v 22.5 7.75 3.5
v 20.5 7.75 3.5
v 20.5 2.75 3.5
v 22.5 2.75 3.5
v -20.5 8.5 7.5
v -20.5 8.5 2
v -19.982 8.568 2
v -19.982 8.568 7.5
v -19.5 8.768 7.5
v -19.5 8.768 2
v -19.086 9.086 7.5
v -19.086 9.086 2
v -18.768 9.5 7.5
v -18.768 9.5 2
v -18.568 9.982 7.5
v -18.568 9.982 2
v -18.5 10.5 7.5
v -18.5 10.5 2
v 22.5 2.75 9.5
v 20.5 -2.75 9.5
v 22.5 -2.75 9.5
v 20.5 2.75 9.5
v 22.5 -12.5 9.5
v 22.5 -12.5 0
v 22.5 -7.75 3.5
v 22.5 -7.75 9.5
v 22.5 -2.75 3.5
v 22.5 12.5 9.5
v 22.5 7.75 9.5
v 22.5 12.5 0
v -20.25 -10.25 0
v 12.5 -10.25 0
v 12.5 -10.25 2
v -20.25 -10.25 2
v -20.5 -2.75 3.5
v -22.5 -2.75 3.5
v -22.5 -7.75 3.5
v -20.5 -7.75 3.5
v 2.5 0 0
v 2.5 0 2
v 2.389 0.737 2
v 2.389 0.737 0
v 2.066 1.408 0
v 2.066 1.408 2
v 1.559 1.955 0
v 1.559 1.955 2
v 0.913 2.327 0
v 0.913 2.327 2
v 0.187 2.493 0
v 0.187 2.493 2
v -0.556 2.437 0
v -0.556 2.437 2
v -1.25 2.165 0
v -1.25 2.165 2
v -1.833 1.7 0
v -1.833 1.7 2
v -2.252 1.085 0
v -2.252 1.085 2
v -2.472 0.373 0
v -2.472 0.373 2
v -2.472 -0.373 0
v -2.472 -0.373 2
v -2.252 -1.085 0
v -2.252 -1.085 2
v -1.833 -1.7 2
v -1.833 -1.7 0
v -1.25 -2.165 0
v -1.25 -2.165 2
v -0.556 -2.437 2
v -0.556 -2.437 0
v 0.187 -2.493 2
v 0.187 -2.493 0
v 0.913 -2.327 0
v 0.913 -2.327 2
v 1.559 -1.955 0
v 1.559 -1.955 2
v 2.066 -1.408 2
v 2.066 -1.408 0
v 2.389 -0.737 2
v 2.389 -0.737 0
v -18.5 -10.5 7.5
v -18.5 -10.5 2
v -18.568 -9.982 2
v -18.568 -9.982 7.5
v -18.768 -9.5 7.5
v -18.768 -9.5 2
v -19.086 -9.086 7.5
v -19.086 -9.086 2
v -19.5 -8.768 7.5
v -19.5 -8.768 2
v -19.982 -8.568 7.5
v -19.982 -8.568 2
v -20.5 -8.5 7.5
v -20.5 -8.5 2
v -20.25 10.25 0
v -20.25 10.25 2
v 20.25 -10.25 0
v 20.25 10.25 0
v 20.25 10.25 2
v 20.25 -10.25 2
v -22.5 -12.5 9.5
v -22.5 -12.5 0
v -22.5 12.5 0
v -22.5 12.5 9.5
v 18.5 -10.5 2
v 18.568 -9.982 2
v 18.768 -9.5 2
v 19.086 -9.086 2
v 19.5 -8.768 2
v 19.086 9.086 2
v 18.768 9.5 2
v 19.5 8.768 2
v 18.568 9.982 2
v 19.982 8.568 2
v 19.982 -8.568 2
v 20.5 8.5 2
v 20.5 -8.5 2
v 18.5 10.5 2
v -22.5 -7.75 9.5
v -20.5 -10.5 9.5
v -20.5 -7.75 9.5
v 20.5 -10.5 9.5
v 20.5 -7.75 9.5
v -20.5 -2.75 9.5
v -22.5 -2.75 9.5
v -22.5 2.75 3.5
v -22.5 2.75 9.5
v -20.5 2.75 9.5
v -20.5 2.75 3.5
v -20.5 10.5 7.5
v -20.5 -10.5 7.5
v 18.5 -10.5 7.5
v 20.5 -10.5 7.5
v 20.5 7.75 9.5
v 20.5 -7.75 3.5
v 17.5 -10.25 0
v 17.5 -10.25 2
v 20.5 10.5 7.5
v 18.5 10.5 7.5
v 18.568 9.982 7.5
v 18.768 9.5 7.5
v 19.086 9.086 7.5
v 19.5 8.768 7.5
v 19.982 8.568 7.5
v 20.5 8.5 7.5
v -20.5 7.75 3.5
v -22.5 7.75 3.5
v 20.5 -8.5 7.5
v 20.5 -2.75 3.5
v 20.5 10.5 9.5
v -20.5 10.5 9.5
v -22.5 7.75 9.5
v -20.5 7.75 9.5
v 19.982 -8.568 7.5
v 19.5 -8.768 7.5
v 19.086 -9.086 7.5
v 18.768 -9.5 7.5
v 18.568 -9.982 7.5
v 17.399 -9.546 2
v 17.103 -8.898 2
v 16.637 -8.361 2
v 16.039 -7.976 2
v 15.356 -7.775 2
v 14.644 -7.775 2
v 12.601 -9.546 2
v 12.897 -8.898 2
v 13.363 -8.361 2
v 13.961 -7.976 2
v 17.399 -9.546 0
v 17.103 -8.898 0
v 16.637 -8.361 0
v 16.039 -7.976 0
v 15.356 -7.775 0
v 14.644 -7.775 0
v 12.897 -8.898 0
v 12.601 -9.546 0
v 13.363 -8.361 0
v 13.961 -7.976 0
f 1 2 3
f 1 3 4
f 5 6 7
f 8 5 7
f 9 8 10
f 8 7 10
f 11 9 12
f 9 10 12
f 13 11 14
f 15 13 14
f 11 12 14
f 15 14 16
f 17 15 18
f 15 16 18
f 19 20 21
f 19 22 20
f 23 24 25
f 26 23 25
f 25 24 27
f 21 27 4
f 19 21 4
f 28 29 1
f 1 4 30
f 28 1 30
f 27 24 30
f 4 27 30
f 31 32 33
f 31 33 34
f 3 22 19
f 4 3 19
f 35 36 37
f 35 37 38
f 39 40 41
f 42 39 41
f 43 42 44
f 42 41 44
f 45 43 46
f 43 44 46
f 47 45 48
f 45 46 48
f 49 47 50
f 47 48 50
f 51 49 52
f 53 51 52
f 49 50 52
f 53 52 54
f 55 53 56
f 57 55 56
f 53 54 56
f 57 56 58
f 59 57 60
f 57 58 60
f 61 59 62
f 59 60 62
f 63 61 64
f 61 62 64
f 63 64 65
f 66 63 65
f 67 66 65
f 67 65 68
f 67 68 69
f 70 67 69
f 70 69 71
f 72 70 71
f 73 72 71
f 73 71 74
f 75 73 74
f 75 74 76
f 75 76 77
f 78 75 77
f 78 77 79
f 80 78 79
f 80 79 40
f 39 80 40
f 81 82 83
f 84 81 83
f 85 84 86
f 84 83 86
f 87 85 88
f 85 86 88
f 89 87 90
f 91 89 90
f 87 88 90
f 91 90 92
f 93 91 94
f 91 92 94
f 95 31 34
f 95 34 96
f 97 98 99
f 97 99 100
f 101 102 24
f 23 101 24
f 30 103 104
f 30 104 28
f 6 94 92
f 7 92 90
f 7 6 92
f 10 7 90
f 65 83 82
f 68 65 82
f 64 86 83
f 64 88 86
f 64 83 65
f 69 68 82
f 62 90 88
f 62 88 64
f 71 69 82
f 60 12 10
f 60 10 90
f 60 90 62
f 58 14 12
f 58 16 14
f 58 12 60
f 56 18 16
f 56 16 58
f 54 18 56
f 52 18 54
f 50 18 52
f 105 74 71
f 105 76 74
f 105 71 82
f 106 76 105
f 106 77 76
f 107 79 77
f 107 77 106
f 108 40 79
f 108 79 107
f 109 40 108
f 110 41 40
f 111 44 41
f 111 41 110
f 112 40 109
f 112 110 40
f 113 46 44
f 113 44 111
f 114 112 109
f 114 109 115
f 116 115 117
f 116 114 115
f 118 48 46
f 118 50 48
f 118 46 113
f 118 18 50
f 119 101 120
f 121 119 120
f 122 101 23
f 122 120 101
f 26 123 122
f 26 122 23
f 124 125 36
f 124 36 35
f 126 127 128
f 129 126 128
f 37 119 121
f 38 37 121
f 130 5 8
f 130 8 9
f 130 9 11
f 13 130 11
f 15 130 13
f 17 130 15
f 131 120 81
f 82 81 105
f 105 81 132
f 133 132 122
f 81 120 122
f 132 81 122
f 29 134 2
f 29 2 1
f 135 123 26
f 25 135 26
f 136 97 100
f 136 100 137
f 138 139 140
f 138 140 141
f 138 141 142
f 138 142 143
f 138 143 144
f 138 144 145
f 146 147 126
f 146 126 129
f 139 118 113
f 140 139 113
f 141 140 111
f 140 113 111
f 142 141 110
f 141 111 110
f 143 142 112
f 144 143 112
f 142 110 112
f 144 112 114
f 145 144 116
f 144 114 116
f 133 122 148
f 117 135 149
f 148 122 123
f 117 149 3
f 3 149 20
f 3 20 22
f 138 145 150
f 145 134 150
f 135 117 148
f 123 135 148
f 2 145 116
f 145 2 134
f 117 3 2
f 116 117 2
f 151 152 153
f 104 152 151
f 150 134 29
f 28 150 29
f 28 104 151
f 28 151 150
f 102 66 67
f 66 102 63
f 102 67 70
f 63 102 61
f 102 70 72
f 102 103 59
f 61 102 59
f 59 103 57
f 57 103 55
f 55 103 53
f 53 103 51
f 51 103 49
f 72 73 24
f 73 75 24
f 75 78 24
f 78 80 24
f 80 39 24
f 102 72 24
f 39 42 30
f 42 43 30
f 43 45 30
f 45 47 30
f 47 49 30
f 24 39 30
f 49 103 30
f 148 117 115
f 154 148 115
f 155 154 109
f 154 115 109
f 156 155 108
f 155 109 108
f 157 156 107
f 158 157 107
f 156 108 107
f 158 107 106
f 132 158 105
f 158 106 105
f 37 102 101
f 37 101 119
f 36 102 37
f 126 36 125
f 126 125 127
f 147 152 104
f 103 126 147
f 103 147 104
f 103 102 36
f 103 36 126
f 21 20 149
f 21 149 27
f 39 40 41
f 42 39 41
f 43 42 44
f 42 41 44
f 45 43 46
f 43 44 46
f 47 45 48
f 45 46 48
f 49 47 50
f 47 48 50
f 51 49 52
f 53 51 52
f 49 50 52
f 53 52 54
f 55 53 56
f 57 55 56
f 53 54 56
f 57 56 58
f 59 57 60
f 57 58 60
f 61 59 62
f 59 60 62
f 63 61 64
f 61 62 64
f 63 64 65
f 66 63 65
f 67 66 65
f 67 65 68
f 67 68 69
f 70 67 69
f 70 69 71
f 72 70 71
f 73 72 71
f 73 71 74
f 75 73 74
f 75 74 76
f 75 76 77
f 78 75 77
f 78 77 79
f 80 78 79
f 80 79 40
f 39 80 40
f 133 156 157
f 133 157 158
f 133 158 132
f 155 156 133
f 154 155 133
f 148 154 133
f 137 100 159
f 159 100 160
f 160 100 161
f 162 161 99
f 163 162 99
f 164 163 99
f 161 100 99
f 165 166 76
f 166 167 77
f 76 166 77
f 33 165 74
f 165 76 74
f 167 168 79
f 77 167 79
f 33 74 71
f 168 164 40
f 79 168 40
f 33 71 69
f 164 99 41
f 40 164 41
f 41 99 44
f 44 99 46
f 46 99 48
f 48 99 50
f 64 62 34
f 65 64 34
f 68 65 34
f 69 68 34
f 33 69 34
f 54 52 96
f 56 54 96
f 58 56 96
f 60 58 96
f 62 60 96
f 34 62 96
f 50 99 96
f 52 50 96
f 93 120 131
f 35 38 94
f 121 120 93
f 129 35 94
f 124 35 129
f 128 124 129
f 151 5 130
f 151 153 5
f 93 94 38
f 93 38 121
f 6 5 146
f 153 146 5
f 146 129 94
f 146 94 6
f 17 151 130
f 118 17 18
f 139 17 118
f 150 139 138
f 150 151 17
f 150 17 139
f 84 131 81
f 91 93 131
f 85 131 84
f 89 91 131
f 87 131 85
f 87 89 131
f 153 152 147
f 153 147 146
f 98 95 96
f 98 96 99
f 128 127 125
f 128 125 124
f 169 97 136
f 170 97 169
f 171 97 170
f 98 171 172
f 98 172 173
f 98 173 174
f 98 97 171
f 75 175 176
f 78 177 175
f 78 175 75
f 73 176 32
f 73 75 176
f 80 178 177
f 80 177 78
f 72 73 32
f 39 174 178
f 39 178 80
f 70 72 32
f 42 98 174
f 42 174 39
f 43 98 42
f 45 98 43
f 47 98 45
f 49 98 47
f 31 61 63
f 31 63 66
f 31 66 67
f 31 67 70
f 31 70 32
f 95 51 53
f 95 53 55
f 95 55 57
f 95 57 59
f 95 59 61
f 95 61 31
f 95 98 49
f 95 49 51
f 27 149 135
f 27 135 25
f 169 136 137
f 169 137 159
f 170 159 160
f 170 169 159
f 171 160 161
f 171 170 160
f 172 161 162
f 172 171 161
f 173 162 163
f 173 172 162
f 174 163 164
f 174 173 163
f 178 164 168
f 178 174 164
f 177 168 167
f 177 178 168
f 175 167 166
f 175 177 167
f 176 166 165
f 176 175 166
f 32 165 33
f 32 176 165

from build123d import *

# Parameters (mm, degrees)
SKETCH_W        = 45
SKETCH_H        = 25
PAD_DEPTH       = 9.5
SKETCH001_W     = 41
SKETCH001_H     = 21
POCKET_DEPTH    = 7.5
SKETCH002_R     = 2.5
POCKET001_DEPTH = 2.001
SKETCH003_W     = 2
SKETCH003_H     = 5
POCKET002_DEPTH = 6
PAD001_DEPTH    = 5.5
PAD002_DEPTH    = 2
SKETCH006_R     = 2.5
POCKET003_DEPTH = 2.001


with BuildPart() as body:
    # Sketch → Pad (new body)
    with BuildSketch(Plane.XY):
        Rectangle(SKETCH_W, SKETCH_H)
    extrude(amount=PAD_DEPTH)

    # Sketch001 (on Face6 of Pad) → Pocket (cut)
    with BuildSketch(Plane.XY.offset(9.5)):
        Rectangle(SKETCH001_W, SKETCH001_H)
    extrude(amount=-POCKET_DEPTH, mode=Mode.SUBTRACT)

    # Sketch002 (on Face11 of Pocket) → Pocket001 (cut, through all)
    with BuildSketch(Plane.XY.offset(2)):
        Circle(SKETCH002_R)
    extrude(amount=-POCKET001_DEPTH, mode=Mode.SUBTRACT)

    # Sketch003 (on Face5 of Pocket001) → Pocket002 (cut)
    with BuildSketch(Plane.XY.offset(9.5)):
        with Locations((-21.5, 5.25)):
            Rectangle(SKETCH003_W, SKETCH003_H)
        with Locations((-21.5, -5.25)):
            Rectangle(SKETCH003_W, SKETCH003_H)
        with Locations((21.5, 5.25)):
            Rectangle(SKETCH003_W, SKETCH003_H)
        with Locations((21.5, -5.25)):
            Rectangle(SKETCH003_W, SKETCH003_H)
    extrude(amount=-POCKET002_DEPTH, mode=Mode.SUBTRACT)

    # Sketch004 (on Face27 of Pocket002) → Pad001 (join)
    with BuildSketch(Plane.XY.offset(2)):
        with BuildLine():
            ThreePointArc((-20.5, 8.5), (-19.085786, 9.085786), (-18.5, 10.5))
            Line((-18.5, 10.5), (-20.5, 10.5))
            Line((-20.5, 10.5), (-20.5, 8.5))
        make_face()
        with BuildLine():
            ThreePointArc((-18.5, -10.5), (-19.085786, -9.085786), (-20.5, -8.5))
            Line((-20.5, -8.5), (-20.5, -10.5))
            Line((-20.5, -10.5), (-18.5, -10.5))
        make_face()
        with BuildLine():
            ThreePointArc((20.5, -8.5), (19.085786, -9.085786), (18.5, -10.5))
            Line((18.5, -10.5), (20.5, -10.5))
            Line((20.5, -10.5), (20.5, -8.5))
        make_face()
        with BuildLine():
            ThreePointArc((18.5, 10.5), (19.085786, 9.085786), (20.5, 8.5))
            Line((20.5, 8.5), (20.5, 10.5))
            Line((20.5, 10.5), (18.5, 10.5))
        make_face()
    extrude(amount=PAD001_DEPTH)


with BuildPart() as body001:
    # Sketch005 → Pad002 (new body)
    with BuildSketch(Plane.XY):
        with BuildLine():
            Line((-20.25, 10.25), (20.25, 10.25))
            Line((20.25, 10.25), (20.25, -10.25))
            Line((20.25, -10.25), (17.5, -10.25))
            ThreePointArc((17.5, -10.25), (15, -7.75), (12.5, -10.25))
            Line((12.5, -10.25), (-20.25, -10.25))
            Line((-20.25, -10.25), (-20.25, 10.25))
        make_face()
    extrude(amount=PAD002_DEPTH)

    # Sketch006 (on Face8 of Pad002) → Pocket003 (cut, through all)
    with BuildSketch(Plane.XY.offset(2)):
        Circle(SKETCH006_R)
    extrude(amount=-POCKET003_DEPTH, mode=Mode.SUBTRACT)


solid = Compound([body.part, body001.part])
